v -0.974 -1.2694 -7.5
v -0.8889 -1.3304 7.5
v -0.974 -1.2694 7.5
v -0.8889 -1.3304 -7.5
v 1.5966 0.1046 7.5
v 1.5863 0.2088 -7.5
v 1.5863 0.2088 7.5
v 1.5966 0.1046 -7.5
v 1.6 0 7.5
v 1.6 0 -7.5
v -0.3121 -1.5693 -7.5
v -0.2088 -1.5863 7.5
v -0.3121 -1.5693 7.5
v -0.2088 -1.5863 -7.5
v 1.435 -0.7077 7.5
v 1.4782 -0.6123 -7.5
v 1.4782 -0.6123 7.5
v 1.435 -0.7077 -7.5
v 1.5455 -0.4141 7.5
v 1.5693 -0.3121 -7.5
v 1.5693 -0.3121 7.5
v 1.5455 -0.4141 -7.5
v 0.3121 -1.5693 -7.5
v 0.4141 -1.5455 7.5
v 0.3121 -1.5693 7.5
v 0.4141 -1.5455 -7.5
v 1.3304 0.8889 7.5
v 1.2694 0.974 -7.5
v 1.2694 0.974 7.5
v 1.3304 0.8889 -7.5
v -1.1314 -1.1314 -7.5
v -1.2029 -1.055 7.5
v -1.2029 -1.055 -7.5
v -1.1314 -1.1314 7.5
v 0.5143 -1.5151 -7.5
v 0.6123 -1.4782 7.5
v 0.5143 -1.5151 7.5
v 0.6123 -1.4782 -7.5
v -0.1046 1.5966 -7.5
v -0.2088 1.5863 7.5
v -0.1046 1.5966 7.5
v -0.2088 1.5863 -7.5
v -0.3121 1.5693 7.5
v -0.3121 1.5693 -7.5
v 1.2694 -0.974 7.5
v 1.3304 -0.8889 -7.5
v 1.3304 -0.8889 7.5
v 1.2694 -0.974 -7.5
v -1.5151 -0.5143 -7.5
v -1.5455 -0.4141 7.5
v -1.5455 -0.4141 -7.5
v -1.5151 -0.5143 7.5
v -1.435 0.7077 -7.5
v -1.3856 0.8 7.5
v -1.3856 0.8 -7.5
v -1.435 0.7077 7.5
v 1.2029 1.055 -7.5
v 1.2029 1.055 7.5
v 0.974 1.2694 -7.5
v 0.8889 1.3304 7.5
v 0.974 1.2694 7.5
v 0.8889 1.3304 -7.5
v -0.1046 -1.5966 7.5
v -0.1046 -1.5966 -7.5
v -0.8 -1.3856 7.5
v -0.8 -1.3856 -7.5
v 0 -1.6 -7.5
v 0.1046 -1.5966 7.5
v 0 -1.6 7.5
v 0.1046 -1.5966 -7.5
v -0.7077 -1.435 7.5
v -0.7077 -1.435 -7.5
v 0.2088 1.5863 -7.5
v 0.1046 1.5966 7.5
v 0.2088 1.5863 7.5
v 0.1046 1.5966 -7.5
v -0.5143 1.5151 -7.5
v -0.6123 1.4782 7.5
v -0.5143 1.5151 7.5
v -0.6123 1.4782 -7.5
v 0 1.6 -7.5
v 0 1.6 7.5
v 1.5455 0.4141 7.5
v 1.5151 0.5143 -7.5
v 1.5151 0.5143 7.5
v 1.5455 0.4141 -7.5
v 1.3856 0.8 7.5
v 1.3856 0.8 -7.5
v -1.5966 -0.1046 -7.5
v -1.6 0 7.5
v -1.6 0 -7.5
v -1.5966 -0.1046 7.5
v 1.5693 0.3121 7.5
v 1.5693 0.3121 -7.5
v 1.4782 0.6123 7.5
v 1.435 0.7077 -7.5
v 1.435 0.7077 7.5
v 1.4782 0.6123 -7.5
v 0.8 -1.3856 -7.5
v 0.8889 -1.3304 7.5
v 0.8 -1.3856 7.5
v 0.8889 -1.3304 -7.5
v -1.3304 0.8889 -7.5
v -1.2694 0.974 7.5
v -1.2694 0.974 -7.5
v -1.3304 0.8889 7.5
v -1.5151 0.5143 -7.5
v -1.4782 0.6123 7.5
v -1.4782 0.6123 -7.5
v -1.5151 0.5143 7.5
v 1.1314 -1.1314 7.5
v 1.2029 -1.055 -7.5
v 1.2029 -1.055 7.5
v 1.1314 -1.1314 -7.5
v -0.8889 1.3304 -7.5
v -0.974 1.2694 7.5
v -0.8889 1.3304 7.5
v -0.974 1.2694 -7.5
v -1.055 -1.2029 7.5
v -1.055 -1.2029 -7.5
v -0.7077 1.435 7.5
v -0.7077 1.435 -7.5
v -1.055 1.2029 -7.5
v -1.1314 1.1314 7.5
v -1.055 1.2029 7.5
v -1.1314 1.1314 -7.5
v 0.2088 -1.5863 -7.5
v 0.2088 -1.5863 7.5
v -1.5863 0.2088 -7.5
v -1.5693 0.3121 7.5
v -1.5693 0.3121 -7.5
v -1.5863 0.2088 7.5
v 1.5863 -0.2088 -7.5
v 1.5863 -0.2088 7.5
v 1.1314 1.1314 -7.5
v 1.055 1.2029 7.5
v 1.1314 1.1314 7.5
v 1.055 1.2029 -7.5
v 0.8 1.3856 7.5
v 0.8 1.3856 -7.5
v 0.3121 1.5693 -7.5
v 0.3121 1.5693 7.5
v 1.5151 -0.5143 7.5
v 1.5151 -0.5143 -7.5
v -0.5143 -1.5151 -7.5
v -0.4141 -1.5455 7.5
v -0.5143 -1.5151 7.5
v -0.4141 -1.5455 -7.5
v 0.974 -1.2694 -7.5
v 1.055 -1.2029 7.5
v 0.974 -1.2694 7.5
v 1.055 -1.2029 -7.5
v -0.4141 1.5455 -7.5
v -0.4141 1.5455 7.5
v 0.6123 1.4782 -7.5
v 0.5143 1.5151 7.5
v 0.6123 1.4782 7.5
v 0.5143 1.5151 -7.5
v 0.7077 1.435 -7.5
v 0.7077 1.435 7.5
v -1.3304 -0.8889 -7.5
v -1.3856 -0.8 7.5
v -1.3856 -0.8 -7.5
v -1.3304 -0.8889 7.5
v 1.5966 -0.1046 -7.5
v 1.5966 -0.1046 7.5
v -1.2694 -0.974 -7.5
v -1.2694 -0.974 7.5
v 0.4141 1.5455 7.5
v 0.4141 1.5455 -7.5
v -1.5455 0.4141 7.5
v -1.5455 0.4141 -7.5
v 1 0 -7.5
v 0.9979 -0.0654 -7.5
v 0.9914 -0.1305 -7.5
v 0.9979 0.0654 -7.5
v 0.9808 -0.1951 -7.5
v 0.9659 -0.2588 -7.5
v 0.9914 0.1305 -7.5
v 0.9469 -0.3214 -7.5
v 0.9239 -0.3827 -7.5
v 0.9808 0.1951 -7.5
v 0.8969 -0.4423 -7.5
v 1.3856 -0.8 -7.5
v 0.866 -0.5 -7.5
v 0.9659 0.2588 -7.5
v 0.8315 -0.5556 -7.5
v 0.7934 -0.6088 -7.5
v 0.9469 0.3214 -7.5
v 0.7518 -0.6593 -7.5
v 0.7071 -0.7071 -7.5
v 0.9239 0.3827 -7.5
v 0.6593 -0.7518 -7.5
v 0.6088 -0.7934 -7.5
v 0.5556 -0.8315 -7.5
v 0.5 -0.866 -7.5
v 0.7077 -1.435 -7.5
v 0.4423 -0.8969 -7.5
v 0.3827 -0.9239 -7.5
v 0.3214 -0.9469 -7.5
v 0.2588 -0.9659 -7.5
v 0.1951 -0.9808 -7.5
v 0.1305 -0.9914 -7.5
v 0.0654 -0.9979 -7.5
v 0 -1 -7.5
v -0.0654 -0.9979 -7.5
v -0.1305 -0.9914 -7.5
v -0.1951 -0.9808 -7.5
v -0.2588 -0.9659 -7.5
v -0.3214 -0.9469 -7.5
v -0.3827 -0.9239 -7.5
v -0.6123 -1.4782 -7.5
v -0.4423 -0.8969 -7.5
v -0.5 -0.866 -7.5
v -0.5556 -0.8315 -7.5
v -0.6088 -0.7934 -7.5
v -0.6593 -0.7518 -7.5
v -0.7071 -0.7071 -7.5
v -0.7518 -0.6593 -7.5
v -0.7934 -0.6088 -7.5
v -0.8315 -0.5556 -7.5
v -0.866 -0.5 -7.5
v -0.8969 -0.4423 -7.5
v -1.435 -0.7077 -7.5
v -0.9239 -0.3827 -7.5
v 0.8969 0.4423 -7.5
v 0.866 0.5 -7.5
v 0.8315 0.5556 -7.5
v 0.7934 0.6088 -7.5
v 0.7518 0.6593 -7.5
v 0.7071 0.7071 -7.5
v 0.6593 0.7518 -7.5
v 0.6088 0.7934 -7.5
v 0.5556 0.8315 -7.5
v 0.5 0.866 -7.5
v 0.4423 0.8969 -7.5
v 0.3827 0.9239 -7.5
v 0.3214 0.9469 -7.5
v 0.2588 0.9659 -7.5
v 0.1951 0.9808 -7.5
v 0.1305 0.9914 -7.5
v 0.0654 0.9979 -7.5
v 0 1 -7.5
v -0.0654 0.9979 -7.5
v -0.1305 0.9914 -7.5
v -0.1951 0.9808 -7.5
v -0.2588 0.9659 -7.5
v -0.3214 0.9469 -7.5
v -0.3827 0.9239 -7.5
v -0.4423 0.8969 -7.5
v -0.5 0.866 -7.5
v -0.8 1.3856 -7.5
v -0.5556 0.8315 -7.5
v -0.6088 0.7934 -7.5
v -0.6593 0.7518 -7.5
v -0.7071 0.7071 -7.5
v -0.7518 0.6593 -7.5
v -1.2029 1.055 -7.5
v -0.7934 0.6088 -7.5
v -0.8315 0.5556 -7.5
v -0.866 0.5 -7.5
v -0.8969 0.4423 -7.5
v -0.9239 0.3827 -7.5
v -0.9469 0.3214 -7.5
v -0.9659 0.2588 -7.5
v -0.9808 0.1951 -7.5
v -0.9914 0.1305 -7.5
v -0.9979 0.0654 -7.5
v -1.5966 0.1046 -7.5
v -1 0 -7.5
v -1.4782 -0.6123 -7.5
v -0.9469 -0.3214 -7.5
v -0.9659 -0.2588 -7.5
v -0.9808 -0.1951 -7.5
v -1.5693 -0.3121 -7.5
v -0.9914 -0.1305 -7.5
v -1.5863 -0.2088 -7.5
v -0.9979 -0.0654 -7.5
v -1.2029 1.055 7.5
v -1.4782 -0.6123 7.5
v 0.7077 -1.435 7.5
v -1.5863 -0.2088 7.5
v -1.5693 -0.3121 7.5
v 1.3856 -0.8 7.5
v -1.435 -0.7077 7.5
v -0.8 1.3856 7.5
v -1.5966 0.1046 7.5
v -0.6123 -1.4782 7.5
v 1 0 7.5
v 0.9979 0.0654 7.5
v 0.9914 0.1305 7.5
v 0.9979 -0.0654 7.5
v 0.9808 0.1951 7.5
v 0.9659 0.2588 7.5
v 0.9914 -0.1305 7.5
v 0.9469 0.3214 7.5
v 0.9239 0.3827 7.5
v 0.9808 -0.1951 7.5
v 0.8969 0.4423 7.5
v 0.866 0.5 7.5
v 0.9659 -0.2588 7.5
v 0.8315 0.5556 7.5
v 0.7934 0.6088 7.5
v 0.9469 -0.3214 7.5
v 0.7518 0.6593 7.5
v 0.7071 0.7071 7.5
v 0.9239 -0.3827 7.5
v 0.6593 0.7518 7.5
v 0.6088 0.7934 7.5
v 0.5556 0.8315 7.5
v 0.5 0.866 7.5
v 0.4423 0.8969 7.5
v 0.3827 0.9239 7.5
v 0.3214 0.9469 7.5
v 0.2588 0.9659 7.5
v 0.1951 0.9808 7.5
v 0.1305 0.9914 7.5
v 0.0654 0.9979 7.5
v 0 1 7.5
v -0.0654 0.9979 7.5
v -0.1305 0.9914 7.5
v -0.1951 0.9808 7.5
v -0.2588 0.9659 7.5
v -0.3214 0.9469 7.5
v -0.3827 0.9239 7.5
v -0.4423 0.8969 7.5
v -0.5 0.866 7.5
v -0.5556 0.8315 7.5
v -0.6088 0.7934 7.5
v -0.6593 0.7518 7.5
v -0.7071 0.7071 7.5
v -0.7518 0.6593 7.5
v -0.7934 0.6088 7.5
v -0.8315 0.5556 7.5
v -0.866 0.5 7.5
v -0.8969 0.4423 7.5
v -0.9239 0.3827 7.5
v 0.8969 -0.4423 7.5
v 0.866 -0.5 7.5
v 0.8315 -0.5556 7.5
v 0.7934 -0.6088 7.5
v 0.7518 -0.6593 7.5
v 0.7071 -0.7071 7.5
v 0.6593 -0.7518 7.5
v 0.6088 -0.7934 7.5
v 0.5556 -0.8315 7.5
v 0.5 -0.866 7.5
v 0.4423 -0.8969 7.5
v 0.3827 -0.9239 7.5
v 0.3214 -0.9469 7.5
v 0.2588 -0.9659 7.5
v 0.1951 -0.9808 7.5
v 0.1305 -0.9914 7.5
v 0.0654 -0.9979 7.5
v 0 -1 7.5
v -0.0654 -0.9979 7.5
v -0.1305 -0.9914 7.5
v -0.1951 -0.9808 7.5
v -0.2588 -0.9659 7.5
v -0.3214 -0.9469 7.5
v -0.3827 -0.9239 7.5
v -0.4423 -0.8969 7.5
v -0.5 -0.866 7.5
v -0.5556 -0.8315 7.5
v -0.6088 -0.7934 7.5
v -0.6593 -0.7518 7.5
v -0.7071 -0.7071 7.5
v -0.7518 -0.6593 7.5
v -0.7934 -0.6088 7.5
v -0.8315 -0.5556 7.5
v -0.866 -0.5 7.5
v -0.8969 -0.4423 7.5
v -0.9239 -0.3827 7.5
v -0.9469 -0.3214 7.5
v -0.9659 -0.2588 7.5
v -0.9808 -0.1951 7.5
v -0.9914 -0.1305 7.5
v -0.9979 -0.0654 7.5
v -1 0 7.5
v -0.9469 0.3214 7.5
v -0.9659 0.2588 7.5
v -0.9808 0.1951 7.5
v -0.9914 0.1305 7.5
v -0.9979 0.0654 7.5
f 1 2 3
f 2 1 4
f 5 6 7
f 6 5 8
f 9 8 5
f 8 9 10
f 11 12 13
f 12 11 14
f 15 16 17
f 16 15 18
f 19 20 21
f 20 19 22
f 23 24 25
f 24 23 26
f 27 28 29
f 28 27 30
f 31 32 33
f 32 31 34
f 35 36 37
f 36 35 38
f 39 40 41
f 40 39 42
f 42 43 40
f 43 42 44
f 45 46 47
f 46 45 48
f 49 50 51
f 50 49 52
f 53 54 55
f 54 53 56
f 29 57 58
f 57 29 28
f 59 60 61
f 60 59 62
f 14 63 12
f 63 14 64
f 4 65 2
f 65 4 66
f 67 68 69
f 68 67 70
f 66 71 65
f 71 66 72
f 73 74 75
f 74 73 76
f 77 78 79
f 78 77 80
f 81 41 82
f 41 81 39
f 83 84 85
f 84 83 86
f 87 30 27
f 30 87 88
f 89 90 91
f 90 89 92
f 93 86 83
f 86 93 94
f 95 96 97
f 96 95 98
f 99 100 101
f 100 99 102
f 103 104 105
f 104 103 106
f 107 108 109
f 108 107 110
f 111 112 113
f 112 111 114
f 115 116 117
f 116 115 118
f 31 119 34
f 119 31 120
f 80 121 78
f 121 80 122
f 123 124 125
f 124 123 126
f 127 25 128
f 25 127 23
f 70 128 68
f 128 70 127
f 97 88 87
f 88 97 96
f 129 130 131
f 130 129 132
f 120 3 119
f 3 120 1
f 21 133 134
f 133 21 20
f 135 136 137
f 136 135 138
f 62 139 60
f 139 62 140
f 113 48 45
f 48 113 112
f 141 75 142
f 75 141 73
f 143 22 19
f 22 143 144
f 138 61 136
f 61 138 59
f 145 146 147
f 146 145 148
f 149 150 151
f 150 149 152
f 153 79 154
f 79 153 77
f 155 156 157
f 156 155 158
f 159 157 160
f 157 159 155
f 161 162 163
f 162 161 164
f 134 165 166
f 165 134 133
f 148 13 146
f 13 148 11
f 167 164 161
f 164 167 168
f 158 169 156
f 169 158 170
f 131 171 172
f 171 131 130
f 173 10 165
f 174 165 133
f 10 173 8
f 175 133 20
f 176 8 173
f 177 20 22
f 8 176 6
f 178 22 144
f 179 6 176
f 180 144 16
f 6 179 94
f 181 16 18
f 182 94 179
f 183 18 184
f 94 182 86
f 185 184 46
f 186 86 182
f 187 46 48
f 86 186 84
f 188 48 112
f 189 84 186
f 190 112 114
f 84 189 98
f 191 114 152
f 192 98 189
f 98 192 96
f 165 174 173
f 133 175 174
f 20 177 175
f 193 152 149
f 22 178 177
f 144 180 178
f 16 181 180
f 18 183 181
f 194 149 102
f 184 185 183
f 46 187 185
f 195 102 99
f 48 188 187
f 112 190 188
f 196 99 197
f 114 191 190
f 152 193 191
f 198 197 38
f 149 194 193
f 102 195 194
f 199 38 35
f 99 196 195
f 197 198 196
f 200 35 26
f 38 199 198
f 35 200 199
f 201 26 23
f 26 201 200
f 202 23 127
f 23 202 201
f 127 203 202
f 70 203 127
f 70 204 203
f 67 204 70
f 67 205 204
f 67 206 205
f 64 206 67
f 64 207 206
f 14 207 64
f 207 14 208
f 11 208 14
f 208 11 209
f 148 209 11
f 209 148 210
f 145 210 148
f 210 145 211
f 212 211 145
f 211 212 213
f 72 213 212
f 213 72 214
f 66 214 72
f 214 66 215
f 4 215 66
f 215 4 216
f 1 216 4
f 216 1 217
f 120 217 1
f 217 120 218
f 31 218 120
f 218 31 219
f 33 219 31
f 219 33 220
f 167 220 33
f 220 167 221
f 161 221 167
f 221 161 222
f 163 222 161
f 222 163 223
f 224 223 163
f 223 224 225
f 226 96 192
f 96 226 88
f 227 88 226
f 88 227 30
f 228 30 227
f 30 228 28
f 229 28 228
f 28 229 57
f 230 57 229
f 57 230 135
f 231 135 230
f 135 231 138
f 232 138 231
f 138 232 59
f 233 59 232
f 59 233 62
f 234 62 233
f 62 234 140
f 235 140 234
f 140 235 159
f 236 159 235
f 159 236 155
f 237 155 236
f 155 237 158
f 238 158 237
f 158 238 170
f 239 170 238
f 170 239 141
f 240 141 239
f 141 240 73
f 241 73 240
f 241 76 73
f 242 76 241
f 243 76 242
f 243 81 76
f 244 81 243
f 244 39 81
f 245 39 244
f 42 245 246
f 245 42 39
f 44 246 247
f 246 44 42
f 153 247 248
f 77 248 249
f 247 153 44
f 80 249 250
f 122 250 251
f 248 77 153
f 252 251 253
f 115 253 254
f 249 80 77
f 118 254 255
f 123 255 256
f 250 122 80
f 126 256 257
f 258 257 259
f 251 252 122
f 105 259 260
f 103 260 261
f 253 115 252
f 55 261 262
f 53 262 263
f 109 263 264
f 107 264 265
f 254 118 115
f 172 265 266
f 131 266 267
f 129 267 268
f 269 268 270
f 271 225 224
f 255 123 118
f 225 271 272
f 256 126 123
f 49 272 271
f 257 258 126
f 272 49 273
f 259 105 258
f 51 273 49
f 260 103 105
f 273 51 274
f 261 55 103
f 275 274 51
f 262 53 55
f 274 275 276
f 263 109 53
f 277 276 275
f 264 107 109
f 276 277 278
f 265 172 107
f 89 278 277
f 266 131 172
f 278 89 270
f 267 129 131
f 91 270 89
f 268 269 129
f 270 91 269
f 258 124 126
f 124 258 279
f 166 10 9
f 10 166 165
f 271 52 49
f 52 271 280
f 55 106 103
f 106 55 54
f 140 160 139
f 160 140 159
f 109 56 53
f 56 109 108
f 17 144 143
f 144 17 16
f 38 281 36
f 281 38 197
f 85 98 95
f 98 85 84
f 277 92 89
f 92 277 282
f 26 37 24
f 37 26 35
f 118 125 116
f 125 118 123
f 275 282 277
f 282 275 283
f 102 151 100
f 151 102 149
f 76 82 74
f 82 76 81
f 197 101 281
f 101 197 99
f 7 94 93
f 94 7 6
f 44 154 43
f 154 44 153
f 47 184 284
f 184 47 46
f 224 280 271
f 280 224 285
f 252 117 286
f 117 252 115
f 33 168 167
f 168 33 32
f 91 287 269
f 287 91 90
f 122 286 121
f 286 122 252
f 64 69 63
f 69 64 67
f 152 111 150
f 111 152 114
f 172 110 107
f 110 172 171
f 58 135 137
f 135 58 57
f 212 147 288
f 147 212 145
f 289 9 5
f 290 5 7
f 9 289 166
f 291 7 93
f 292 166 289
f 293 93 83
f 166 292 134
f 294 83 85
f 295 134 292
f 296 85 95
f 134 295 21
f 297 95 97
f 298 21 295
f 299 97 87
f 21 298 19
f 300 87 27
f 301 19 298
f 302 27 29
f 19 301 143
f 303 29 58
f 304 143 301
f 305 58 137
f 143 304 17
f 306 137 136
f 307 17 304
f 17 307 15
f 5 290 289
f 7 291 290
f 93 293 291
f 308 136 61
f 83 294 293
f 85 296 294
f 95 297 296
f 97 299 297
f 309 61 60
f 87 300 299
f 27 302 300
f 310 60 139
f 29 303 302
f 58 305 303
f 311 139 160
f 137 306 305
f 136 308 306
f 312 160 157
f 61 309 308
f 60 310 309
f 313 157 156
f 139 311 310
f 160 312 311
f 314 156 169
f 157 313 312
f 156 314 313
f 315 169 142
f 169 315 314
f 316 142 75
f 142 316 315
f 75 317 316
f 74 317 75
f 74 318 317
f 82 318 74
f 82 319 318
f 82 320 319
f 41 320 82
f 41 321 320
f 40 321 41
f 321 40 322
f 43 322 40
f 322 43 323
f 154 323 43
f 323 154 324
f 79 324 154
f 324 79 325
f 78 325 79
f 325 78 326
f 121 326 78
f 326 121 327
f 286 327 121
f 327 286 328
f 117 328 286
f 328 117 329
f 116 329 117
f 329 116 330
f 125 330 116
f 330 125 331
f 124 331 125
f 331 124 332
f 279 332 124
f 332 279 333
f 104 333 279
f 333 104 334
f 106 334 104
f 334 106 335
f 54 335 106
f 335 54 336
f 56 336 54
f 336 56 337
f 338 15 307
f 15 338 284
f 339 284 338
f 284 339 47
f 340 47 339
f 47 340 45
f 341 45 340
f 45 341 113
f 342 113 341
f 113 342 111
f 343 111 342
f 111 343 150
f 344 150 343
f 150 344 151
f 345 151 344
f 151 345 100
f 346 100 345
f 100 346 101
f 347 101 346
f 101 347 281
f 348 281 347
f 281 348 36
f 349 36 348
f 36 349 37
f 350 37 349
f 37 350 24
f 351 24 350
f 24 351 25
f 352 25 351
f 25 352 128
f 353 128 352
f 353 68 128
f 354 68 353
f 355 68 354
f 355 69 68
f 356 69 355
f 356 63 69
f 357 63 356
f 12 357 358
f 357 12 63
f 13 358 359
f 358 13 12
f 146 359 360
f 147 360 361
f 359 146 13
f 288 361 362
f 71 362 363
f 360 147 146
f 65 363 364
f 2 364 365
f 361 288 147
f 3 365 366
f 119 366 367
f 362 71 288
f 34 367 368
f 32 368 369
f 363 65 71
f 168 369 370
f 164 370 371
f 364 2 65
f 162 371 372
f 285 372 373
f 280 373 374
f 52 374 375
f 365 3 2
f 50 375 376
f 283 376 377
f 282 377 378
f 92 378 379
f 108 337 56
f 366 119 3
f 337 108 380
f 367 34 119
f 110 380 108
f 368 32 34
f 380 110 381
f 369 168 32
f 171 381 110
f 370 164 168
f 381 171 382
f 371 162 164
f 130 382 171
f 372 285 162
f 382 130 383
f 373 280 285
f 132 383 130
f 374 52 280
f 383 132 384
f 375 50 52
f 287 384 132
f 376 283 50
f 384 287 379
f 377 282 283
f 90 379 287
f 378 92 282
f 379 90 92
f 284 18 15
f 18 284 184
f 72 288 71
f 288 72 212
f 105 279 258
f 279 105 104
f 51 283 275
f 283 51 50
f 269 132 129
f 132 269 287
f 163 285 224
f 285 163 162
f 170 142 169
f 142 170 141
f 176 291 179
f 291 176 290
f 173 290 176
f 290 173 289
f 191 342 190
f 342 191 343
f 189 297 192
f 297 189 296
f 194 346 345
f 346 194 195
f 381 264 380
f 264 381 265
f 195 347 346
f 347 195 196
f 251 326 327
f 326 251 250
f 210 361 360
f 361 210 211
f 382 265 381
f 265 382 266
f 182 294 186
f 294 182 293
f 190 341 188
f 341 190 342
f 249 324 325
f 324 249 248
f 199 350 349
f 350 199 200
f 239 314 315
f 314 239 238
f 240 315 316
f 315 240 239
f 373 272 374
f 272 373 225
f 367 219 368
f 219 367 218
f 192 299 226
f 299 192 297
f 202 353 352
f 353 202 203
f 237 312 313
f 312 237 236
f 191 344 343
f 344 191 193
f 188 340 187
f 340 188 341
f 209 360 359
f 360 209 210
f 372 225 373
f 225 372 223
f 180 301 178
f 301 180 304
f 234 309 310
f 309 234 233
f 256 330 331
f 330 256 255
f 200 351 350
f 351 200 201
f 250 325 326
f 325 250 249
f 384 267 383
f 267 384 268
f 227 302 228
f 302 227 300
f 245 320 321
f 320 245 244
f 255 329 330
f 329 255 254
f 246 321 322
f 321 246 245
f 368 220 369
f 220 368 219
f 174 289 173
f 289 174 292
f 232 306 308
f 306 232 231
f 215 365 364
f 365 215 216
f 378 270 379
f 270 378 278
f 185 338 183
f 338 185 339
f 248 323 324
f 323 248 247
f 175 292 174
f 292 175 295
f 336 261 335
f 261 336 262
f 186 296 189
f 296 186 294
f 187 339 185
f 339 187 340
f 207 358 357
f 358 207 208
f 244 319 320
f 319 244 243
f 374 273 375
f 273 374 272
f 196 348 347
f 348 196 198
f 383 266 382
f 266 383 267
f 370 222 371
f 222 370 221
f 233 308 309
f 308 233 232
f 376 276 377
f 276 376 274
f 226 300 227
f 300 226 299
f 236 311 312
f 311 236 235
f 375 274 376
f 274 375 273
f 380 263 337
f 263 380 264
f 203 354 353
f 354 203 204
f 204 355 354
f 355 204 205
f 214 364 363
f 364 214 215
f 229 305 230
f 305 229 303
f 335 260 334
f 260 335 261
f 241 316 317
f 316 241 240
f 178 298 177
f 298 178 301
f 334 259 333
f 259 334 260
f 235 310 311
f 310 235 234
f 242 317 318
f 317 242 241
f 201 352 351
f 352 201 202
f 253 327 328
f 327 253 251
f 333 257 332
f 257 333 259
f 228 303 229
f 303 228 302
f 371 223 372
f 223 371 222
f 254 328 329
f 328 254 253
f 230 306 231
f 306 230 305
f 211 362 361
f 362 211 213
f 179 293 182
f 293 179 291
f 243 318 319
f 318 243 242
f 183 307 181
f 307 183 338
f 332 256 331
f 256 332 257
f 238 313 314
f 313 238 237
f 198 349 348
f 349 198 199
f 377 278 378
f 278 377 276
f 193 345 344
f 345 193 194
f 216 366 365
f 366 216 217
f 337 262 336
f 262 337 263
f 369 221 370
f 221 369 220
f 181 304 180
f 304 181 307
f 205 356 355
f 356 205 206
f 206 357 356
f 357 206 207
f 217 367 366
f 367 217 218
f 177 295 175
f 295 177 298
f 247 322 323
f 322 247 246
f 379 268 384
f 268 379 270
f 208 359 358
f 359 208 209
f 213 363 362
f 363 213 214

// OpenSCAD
// Heatshrink sleeving / tubing (single connected solid)

// Parameters
length = 15; //[8:30:1]
forced_id = 0; //[0:10:0.1]
center = true; //[0:1:1]
nominal_id = 2.0; //[1.0:6.0:0.1]
nominal_od = 3.2; //[1.6:6.4:0.1]
wall_min = 0.4; //[0.2:1.2:0.05]
overlap = 1.0; //[0.5:2.0:0.1]
bore_eps = 0.2; //[0.05:0.5:0.05]

// Resistor params kept but not used for this part
res_body_length = 6; //[3:15:1]
res_body_diameter = 2.2; //[1.2:5:0.1]
lead_diameter = 0.6; //[0.3:1.2:0.05]
lead_length_each_side = 12; //[6:30:1]
bare_lead = 5; //[2:12:1]
sleeving_length = 7; //[3:20:1]

$fn = 96;

function id_eff() = (forced_id > 0 ? forced_id : nominal_id);
function od_eff() = max(nominal_od + (id_eff() - nominal_id), id_eff() + 2*wall_min);

module heatshrink_sleeve(len=length, id=id_eff(), od=od_eff(), ctr=center) {
  // Ensure a visible wall even if parameters are inconsistent
  wall = max(wall_min, (od - id)/2);
  od2 = id + 2*wall;

  color([0.85, 0.85, 0.8])
  difference() {
    cylinder(h=len, r=od2/2, center=ctr);
    cylinder(h=len + bore_eps, r=id/2, center=ctr);
  }
}

// Output: one connected solid (the sleeve itself)
heatshrink_sleeve();
